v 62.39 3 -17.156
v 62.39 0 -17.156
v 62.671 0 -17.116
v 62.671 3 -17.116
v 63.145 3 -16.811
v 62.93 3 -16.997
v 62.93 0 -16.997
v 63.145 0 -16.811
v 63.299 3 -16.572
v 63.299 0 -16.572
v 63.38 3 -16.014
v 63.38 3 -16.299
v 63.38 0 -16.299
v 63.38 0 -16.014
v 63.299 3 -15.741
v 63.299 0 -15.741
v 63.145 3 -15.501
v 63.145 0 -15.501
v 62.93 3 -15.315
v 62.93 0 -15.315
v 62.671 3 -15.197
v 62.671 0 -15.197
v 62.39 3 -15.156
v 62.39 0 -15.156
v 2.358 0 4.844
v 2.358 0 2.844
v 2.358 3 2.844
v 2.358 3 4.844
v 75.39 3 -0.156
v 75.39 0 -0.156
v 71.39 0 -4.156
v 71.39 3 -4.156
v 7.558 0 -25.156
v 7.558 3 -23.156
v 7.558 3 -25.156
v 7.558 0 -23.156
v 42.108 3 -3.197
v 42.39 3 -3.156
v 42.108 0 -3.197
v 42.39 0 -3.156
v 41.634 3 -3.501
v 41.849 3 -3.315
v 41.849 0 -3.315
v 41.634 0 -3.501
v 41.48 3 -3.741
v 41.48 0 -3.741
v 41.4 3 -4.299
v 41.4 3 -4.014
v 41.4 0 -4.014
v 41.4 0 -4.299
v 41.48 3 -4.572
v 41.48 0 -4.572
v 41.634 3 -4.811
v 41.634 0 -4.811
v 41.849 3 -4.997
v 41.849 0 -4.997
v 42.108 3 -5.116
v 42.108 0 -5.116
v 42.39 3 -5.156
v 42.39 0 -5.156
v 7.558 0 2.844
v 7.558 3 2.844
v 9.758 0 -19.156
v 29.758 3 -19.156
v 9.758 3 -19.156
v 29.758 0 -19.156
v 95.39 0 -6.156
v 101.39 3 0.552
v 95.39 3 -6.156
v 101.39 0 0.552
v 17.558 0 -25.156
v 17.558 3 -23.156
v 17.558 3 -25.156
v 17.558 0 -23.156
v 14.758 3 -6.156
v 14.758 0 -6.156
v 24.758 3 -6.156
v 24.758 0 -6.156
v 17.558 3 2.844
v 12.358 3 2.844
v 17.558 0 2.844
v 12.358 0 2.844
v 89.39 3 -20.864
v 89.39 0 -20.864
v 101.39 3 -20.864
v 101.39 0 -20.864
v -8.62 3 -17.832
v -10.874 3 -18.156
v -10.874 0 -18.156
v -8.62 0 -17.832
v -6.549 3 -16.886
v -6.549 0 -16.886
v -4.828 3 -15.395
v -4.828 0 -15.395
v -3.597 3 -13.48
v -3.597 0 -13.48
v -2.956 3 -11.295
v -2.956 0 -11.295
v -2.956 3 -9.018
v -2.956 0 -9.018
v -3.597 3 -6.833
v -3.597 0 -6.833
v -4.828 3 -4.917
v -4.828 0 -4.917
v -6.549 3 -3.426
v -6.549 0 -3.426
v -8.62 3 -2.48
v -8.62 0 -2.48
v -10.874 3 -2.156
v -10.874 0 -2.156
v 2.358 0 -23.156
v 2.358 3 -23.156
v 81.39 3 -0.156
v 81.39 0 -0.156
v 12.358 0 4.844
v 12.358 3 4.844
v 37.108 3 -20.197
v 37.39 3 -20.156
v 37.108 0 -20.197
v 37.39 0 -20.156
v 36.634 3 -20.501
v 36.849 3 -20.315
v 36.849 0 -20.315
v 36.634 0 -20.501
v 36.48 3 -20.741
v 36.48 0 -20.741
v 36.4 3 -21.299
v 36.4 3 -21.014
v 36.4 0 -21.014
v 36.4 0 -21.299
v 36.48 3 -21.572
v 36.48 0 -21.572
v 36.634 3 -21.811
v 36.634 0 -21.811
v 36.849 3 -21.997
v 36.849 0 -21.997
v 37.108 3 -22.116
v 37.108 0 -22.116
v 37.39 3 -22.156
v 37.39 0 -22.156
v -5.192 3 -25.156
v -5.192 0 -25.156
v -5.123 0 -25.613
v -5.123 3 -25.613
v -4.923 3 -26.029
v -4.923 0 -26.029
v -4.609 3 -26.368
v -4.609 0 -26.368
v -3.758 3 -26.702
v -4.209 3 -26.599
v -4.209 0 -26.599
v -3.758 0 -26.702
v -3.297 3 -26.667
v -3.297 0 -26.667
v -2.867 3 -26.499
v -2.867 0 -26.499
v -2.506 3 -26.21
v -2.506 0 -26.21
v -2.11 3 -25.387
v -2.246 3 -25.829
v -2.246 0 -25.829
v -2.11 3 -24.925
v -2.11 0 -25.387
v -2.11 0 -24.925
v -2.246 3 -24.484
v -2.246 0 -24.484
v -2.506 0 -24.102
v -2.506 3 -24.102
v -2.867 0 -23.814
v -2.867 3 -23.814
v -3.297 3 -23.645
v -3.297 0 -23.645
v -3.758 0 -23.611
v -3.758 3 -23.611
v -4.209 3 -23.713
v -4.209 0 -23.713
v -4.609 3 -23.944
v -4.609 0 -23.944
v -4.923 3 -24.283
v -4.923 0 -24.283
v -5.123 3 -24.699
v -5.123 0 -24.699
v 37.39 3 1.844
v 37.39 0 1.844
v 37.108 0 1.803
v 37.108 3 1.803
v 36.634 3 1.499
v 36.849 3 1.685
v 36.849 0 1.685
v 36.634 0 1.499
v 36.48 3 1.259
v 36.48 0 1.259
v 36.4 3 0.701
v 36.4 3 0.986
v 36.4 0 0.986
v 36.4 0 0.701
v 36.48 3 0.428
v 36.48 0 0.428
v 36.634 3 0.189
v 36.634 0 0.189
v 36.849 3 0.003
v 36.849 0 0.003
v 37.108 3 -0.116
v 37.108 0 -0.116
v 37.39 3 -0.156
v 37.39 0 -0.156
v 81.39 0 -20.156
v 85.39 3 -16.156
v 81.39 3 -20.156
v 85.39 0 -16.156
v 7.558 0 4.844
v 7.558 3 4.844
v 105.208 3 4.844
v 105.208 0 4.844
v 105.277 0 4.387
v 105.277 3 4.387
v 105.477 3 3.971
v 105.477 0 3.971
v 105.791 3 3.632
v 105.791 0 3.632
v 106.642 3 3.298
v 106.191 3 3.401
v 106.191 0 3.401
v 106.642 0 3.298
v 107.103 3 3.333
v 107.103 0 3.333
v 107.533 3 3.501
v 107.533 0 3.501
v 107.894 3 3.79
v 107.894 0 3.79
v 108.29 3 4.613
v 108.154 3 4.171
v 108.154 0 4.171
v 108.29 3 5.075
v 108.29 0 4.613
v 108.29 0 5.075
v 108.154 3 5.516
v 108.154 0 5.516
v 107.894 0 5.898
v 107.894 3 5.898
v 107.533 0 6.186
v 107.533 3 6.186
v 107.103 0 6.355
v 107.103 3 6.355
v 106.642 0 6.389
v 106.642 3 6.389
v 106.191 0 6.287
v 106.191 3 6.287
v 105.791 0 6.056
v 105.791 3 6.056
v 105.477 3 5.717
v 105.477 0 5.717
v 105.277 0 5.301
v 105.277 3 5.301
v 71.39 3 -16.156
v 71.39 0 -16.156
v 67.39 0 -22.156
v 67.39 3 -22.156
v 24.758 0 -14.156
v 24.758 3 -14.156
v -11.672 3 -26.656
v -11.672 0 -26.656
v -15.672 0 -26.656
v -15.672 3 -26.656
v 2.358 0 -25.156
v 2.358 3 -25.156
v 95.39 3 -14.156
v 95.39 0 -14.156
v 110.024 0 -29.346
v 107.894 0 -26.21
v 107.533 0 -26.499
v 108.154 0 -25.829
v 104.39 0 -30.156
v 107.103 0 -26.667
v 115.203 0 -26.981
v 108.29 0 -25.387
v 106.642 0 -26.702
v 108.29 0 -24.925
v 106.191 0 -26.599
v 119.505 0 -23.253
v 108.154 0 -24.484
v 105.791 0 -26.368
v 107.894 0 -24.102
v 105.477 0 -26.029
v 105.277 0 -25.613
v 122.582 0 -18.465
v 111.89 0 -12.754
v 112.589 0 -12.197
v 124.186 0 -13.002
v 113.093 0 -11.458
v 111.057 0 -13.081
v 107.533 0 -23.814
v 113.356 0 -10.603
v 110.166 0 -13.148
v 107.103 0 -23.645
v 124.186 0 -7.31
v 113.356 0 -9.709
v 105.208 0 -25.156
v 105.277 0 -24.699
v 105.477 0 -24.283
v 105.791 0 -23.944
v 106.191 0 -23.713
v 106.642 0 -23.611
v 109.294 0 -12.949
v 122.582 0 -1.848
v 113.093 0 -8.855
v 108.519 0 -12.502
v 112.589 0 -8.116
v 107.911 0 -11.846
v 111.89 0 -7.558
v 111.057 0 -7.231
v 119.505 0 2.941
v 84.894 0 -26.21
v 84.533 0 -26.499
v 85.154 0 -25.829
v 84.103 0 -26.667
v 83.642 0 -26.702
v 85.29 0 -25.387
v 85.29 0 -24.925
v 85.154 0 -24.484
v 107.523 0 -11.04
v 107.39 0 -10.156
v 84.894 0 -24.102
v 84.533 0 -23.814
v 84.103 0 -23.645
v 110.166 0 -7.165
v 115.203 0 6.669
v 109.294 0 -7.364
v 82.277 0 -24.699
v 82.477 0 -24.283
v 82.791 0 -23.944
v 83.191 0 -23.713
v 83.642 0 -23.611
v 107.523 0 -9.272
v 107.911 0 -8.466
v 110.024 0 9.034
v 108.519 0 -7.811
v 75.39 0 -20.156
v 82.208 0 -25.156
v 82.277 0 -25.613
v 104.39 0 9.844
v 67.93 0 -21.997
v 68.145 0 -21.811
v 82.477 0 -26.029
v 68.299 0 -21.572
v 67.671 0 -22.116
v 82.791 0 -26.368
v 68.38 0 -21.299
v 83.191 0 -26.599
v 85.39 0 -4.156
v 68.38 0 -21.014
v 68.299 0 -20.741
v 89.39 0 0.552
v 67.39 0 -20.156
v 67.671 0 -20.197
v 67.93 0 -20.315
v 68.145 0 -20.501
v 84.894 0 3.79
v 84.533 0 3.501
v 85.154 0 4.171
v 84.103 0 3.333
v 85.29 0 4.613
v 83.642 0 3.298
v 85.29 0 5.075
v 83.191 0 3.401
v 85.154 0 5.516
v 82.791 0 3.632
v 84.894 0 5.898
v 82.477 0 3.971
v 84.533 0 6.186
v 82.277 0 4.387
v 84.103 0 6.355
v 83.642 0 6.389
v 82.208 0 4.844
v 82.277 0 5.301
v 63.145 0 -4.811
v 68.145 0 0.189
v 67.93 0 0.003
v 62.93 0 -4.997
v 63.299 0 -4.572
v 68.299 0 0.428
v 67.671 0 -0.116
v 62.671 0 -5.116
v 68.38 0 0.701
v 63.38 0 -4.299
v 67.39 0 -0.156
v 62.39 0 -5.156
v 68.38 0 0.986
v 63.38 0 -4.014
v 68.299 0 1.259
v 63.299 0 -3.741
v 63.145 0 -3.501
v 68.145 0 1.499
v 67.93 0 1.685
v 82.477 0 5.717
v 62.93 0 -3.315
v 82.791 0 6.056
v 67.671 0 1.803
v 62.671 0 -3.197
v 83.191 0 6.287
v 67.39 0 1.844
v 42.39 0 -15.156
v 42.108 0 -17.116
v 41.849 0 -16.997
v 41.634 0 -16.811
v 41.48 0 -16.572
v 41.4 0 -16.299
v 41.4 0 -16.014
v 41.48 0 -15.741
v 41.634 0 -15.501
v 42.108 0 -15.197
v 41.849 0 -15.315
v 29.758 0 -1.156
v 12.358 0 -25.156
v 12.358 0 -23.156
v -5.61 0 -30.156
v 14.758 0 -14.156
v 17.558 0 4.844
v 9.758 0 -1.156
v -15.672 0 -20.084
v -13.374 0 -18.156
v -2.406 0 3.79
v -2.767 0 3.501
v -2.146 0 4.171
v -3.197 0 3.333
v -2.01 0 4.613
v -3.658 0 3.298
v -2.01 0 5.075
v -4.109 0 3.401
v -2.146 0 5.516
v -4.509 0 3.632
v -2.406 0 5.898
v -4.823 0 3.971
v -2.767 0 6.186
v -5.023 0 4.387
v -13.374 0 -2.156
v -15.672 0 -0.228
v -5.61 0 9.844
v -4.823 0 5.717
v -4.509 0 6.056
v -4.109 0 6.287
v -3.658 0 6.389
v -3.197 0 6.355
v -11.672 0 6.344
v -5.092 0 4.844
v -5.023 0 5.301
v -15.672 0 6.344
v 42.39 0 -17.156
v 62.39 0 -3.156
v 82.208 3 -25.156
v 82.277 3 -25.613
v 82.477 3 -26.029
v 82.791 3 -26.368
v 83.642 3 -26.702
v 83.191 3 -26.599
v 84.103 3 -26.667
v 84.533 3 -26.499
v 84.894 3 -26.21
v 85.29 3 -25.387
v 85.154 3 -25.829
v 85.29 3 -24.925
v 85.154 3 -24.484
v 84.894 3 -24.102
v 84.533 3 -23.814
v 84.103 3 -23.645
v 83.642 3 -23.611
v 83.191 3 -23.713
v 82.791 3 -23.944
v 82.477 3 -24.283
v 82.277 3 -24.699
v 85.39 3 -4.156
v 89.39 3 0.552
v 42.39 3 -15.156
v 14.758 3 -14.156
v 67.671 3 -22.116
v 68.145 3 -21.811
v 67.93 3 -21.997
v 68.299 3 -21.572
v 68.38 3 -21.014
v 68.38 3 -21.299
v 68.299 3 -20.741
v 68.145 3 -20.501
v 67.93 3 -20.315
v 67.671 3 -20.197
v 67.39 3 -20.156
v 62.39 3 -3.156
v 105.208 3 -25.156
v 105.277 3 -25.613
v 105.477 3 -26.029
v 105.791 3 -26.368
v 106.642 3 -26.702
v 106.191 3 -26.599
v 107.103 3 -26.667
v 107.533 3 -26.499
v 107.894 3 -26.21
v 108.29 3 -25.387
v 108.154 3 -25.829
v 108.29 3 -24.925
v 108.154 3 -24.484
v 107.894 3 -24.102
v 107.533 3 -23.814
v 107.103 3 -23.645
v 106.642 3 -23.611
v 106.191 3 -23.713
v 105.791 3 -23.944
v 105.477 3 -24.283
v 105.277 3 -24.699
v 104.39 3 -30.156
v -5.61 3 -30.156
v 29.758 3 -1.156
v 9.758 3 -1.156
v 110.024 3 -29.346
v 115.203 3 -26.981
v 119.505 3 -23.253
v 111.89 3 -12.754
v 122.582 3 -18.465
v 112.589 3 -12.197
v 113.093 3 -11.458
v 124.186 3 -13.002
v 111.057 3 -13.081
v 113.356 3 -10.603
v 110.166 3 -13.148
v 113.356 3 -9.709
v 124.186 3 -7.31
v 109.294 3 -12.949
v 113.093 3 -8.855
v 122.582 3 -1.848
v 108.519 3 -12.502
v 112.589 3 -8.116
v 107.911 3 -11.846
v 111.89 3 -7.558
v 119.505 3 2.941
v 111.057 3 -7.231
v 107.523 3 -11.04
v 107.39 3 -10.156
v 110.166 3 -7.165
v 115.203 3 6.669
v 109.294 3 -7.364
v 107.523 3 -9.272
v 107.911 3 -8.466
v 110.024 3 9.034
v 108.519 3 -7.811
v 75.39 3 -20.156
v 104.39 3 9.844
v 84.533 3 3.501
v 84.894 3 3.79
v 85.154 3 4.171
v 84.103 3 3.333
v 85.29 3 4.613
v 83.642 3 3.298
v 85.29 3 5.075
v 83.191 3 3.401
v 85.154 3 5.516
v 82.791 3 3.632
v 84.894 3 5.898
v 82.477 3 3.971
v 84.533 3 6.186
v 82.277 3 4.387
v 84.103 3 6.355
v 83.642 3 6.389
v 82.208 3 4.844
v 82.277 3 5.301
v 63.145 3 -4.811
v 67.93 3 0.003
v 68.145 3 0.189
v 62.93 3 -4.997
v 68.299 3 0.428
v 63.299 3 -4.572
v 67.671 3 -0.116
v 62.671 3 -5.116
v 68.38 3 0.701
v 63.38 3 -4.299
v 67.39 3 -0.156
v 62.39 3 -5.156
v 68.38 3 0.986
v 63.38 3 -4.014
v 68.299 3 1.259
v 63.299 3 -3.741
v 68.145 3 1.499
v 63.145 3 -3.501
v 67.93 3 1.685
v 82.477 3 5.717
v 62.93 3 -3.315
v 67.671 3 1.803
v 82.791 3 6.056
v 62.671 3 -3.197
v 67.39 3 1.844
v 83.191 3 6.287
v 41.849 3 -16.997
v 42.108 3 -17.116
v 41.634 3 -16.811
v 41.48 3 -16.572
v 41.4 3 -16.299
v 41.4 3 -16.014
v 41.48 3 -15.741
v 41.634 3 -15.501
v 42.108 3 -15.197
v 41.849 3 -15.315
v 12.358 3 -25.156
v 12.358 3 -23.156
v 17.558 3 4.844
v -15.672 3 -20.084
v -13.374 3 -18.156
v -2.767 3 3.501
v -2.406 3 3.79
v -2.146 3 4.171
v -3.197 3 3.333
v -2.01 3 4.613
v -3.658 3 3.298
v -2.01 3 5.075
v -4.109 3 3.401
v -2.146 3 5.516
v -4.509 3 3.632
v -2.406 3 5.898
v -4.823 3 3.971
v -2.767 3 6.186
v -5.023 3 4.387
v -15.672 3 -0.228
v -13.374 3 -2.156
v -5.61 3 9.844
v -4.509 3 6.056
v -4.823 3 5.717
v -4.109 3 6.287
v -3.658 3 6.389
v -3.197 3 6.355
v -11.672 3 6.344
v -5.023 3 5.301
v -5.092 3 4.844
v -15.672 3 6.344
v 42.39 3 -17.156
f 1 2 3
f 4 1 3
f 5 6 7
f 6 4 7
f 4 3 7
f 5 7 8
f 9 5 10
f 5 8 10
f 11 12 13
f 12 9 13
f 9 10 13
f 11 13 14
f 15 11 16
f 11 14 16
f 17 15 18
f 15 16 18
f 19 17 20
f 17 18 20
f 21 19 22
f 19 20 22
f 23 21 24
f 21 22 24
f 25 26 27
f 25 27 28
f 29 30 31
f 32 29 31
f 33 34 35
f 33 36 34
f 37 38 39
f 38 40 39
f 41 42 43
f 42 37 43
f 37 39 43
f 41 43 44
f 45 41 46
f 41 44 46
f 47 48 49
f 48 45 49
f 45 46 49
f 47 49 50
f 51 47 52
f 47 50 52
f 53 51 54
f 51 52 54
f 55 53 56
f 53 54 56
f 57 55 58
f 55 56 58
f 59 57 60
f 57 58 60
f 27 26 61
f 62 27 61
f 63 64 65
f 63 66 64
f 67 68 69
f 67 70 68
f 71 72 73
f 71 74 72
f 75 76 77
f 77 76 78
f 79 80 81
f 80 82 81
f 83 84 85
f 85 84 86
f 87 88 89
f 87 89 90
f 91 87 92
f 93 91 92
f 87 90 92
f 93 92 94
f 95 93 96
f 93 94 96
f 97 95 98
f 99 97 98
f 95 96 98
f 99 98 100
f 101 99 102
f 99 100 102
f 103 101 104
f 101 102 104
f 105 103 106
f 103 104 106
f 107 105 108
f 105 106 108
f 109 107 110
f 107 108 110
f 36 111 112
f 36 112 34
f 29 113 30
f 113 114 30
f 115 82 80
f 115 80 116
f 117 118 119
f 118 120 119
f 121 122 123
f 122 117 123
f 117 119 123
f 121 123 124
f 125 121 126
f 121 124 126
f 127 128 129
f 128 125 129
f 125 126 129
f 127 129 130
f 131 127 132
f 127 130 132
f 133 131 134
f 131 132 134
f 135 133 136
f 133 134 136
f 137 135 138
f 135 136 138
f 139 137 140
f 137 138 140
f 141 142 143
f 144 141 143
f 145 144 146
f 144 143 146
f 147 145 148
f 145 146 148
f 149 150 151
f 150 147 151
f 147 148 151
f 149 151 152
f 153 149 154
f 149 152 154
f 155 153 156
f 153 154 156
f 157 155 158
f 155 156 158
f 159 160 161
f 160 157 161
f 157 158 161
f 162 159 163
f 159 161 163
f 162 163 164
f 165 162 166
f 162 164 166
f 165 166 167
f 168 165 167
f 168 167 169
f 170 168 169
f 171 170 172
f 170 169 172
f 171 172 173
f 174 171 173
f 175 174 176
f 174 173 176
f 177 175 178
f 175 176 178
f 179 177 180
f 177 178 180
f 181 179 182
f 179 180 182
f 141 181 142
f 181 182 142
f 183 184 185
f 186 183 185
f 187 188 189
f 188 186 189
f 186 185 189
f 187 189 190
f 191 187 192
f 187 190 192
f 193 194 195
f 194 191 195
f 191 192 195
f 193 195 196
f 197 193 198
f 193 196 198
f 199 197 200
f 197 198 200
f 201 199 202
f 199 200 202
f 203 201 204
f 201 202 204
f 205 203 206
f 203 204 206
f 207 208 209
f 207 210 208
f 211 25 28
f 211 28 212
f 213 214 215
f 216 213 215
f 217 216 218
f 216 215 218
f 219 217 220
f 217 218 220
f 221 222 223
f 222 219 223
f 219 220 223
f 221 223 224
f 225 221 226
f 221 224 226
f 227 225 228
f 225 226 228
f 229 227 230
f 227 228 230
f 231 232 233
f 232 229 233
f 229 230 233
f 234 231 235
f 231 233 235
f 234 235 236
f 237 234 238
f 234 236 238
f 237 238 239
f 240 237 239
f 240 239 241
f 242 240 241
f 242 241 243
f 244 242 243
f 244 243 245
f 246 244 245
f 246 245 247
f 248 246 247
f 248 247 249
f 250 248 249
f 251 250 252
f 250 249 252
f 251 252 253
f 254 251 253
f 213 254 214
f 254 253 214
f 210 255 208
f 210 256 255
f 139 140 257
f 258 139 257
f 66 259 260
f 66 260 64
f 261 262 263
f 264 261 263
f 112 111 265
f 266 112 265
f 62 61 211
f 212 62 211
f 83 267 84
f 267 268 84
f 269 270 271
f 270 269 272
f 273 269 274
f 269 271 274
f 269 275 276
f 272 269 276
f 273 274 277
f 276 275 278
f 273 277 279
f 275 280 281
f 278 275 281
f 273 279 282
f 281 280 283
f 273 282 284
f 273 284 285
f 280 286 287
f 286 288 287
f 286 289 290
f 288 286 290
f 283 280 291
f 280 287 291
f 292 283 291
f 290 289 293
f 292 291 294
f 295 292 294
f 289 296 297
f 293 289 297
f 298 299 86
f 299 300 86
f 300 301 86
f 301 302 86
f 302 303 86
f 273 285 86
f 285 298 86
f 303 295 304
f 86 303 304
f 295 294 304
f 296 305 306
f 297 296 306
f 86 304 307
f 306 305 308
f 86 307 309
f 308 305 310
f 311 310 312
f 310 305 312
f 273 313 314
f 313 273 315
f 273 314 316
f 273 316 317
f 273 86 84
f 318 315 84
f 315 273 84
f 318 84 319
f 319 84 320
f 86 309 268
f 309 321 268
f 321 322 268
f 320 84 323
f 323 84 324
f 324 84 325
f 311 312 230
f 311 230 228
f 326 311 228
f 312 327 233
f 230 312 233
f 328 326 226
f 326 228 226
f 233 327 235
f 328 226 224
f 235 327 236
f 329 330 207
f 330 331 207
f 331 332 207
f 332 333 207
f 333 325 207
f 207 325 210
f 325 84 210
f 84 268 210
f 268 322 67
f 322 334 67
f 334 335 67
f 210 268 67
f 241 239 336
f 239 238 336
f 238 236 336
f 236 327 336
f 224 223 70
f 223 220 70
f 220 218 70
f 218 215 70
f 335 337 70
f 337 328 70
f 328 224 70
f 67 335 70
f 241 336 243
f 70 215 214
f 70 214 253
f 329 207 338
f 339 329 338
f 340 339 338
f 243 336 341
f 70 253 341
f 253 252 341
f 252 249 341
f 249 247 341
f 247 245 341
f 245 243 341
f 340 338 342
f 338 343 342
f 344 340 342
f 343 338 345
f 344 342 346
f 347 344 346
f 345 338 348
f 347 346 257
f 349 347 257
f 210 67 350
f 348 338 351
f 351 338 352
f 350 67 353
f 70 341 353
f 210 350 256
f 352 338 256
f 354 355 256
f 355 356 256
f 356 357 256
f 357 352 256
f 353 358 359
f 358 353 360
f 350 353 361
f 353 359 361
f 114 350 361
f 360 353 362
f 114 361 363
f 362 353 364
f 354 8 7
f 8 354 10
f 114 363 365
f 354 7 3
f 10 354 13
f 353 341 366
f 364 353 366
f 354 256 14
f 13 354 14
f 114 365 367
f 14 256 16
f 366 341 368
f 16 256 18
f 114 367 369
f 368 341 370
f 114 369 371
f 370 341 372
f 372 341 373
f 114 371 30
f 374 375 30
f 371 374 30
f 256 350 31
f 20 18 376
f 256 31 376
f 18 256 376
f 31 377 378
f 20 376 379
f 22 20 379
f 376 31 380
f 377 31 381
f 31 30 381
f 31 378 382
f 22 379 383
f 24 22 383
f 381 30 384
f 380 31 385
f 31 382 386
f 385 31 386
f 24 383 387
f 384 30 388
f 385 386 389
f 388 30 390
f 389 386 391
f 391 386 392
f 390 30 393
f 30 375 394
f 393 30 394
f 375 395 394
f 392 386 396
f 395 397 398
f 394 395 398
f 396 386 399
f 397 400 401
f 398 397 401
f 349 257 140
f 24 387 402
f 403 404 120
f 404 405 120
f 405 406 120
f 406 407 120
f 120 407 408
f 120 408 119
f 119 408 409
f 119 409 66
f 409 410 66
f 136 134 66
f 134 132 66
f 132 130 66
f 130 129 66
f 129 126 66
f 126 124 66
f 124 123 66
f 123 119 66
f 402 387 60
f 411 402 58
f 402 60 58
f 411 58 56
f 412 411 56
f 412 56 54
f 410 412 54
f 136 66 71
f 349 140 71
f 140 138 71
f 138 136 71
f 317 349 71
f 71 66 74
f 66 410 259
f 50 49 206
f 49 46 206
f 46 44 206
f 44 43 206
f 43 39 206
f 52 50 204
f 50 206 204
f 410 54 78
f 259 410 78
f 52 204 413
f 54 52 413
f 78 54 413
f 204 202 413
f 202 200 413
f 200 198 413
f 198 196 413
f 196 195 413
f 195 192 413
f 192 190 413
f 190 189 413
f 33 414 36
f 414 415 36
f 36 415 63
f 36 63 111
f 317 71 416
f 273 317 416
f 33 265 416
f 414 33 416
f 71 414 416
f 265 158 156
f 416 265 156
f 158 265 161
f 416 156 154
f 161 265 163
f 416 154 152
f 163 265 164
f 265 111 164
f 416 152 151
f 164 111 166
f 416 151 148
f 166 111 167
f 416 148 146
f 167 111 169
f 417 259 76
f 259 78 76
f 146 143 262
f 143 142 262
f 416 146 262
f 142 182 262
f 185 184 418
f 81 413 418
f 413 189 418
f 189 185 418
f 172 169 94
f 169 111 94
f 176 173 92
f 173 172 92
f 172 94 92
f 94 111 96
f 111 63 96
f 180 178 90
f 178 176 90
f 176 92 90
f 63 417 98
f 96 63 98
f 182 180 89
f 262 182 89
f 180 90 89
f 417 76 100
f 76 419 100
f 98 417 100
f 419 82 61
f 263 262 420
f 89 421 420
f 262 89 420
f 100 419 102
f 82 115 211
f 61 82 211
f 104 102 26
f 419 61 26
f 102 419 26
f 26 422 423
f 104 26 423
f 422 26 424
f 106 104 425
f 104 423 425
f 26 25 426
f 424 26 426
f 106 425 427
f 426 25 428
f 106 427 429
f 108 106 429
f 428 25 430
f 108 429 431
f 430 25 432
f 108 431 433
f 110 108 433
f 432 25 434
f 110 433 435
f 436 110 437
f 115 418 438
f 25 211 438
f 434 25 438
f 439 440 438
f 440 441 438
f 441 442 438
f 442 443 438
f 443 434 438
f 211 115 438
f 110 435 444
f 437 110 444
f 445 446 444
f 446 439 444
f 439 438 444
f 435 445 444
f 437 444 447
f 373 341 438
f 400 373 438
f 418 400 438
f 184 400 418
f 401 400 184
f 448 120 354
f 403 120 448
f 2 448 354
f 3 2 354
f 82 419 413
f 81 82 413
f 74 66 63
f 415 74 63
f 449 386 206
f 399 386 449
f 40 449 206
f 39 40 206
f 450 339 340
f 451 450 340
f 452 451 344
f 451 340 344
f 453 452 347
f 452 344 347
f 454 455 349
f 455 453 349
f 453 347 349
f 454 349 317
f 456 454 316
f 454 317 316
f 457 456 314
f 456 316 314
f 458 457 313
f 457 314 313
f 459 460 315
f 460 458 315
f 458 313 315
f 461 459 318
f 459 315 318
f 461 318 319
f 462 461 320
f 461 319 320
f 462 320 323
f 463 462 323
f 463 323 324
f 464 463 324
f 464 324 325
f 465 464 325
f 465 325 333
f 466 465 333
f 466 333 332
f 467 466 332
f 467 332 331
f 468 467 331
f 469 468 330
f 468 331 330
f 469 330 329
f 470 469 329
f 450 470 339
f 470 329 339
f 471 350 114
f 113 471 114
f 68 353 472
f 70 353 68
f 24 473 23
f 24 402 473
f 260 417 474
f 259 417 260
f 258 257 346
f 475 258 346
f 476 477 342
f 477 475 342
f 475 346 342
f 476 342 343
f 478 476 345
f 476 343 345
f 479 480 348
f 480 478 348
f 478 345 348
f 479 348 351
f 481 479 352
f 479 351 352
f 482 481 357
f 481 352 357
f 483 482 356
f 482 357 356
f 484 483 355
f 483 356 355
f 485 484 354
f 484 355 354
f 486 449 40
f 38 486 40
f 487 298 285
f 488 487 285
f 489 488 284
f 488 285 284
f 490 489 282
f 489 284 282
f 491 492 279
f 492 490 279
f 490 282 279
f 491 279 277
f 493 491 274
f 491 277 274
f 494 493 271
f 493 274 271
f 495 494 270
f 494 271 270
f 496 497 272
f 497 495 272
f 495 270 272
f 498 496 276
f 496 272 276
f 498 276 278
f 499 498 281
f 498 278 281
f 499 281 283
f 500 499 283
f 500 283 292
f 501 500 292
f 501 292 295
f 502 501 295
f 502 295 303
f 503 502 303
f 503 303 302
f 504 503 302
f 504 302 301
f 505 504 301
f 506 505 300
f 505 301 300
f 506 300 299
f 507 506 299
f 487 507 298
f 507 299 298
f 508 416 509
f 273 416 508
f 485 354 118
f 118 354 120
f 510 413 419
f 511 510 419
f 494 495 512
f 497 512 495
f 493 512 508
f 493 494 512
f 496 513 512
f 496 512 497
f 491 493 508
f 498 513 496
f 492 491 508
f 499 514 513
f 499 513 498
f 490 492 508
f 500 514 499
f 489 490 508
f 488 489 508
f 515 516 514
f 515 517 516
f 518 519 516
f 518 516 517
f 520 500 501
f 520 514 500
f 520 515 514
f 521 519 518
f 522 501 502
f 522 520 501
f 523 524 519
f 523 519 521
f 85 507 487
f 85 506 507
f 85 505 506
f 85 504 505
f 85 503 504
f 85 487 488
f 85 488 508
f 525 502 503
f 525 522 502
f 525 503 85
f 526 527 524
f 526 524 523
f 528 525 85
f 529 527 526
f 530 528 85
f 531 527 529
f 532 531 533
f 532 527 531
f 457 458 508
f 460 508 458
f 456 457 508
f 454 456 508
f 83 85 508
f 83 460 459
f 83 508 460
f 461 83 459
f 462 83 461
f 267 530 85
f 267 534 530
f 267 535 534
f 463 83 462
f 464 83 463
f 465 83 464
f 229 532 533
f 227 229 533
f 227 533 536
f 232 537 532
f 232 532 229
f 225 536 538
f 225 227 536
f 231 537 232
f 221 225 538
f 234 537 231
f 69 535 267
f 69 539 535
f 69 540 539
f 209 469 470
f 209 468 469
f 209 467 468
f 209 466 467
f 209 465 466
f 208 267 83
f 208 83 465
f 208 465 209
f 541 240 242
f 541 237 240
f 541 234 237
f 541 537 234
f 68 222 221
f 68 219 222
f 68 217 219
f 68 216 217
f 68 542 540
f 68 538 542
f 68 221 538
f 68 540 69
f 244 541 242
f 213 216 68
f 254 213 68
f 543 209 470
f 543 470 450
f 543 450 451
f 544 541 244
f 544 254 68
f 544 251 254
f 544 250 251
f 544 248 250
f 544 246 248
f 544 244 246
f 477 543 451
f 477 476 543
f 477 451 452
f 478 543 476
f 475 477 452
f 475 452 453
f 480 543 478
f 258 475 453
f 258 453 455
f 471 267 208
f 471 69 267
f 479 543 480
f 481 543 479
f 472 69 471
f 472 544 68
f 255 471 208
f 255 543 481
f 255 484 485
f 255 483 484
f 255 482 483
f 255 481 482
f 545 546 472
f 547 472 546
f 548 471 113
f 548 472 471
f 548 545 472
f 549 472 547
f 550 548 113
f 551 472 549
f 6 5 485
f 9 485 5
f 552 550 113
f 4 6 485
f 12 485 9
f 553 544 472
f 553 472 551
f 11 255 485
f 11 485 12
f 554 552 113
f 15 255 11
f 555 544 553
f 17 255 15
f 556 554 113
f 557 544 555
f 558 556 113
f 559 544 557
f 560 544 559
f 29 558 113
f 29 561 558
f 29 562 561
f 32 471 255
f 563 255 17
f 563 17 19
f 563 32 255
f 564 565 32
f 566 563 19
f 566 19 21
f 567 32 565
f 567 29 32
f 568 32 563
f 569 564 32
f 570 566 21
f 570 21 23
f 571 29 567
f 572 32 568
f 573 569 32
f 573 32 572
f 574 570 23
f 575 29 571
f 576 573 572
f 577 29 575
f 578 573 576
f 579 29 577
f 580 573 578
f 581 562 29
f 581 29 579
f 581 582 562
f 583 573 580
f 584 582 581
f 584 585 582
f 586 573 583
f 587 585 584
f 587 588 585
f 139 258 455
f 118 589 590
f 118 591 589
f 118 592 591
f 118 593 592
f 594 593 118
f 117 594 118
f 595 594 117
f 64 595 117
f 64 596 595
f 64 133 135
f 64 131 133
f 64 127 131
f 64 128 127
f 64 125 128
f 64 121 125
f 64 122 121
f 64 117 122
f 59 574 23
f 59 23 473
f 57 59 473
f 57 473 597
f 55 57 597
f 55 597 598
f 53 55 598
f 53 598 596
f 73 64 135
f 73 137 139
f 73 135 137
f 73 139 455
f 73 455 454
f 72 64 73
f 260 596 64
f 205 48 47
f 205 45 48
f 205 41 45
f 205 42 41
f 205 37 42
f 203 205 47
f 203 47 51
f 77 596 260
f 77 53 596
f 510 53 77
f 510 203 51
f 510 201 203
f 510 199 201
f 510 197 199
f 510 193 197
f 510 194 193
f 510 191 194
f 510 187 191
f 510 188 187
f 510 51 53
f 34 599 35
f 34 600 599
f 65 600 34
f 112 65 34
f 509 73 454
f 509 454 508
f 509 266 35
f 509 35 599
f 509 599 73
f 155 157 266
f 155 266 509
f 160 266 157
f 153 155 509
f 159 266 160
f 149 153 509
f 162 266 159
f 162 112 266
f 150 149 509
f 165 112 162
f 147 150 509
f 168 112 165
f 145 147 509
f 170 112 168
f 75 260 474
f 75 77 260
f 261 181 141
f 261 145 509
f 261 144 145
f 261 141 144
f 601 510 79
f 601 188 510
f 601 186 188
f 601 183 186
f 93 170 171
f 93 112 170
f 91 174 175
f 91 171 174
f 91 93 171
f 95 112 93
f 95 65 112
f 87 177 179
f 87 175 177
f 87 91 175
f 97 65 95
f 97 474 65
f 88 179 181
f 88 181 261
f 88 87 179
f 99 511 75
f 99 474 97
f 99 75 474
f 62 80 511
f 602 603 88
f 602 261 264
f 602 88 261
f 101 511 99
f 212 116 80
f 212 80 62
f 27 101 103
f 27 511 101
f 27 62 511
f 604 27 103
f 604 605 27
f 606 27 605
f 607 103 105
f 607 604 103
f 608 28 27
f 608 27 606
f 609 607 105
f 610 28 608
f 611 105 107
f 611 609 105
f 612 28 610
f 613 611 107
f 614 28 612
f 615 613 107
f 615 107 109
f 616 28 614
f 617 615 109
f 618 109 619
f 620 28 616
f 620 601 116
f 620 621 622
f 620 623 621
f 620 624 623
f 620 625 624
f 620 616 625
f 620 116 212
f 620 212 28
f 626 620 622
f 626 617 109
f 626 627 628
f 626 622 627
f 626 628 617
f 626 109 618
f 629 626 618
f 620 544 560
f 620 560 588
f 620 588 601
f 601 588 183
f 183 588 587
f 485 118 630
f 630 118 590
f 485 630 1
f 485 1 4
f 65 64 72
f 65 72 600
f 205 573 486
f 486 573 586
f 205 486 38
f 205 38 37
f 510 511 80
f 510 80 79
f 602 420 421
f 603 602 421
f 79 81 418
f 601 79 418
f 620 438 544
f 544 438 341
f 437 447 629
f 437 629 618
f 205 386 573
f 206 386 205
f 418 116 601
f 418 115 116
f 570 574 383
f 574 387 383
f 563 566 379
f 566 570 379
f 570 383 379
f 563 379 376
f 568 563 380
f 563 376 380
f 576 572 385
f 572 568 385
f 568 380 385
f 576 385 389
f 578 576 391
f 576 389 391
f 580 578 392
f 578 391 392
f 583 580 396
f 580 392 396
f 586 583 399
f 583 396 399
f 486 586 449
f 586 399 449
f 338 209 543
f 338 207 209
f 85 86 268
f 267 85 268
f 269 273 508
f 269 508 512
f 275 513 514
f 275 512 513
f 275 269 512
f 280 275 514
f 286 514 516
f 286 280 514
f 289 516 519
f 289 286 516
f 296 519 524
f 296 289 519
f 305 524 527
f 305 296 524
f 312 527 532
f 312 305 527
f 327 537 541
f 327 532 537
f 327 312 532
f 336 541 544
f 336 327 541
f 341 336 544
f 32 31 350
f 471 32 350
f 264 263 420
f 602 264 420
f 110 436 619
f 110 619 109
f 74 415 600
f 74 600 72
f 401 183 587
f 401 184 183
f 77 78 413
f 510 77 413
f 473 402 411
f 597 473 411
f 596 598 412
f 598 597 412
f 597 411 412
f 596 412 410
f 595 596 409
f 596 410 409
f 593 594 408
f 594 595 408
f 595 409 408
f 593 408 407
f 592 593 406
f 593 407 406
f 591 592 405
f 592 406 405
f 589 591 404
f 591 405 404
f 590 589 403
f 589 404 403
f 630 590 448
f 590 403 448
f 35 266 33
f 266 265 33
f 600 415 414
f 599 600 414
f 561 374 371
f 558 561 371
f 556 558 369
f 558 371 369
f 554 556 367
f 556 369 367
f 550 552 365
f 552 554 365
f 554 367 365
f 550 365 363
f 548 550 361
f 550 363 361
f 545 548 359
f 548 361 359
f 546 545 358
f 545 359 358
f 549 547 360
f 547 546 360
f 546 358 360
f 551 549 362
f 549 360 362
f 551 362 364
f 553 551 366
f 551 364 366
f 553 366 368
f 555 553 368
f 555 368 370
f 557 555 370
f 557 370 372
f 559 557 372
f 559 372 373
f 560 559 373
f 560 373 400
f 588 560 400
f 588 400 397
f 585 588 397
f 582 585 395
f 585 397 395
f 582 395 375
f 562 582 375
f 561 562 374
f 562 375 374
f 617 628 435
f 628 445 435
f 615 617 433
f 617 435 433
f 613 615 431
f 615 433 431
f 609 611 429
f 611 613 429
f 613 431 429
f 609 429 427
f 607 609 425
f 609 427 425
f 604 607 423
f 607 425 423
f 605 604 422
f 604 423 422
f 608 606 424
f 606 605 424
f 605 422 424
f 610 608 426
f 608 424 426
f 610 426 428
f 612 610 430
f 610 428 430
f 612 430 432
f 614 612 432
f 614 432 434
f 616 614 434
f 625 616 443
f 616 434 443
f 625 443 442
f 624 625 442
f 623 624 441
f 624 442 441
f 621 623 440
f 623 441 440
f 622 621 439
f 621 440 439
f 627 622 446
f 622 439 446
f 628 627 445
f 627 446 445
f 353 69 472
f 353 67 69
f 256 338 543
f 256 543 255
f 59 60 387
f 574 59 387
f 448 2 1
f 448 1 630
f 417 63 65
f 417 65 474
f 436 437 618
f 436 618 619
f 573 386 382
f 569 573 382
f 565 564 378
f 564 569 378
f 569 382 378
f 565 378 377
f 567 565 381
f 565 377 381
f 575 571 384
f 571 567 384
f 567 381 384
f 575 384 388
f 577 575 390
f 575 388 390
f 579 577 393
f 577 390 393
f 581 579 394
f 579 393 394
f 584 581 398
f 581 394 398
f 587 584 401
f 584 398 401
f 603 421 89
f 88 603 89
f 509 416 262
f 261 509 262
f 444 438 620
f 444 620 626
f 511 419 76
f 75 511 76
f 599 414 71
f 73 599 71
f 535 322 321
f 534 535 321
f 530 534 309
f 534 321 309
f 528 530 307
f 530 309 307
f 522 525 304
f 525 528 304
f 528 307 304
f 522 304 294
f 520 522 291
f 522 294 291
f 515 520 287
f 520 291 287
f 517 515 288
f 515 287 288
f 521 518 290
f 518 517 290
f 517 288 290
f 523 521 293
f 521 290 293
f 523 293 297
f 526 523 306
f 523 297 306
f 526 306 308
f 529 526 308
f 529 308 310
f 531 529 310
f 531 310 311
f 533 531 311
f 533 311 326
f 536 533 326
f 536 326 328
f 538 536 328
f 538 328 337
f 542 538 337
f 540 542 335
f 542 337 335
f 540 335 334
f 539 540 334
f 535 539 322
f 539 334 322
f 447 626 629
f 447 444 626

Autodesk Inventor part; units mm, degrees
ref_plane "YZ Plane" through (0, 0, 0) normal (1, 0, 0) x (0, 1, 0)
ref_plane "XZ Plane" through (0, 0, 0) normal (0, 1, 0) x (-1, 0, 0)
ref_plane "XY Plane" through (0, 0, 0) normal (0, 0, 1) x (1, 0, 0)
sketch "Sketch1" plane through (0, 0, 0) normal (0, 1, 0) x (-1, 0, 0)
  line L0 (-71.934, -191.4381) -> (-71.9231, -191.4456)
  line L1 (19.6087, -153.4475) -> (19.6065, -153.4456)
  line L2 (-67.3897, -0.1562) -> (-37.3897, -0.1562)
  line L3 (-37.3897, 1.8438) -> (-67.3897, 1.8438)
  line L4 (-62.3897, -3.1562) -> (-42.3897, -3.1562)
  line L5 (-42.3897, -5.1562) -> (-62.3897, -5.1562)
  line L6 (-113.9275, -186.1817) -> (-113.9275, -186.2664)
  line L7 (-115.4443, -311.1974) -> (-115.4443, -311.1982)
  line L8 (-113.9275, -180.4456) -> (-113.9275, -180.5089)
  circle A0 centre (-110.3897, -10.1562) radius 3
  arc A1 (10.8743, -2.1562) -> (10.8743, -18.1562) centre (10.8743, -10.1562) ccw
  arc A2 (-42.3897, -5.1562) -> (-42.3897, -3.1562) centre (-42.3897, -4.1562) ccw
  arc A3 (-62.3897, -3.1562) -> (-62.3897, -5.1562) centre (-62.3897, -4.1562) ccw
  arc A4 (-67.3897, 1.8438) -> (-67.3897, -0.1562) centre (-67.3897, 0.8438) ccw
  arc A5 (-37.3897, -0.1562) -> (-37.3897, 1.8438) centre (-37.3897, 0.8438) ccw
  arc A6 (-104.3897, 9.8438) -> (-104.3897, -30.1562) centre (-104.3897, -10.1562) ccw
  line L9 (5.6103, 9.8438) -> (11.6725, 6.3438)
  line L10 (11.6725, 6.3438) -> (15.6725, 6.3438)
  line L11 (15.6725, 6.3438) -> (15.6725, -0.2278)
  line L12 (15.6725, -0.2278) -> (13.3743, -2.1562)
  line L13 (13.3743, -2.1562) -> (10.8743, -2.1562)
  line L14 (5.6103, 9.8438) -> (-104.3897, 9.8438)
  line L15 (-89.3897, 0.552) -> (-101.3897, 0.552)
  line L16 (-101.3897, 0.552) -> (-95.3897, -6.1562)
  line L17 (-95.3897, -6.1562) -> (-89.3897, 0.552)
  line L18 (-85.3897, -4.1562) -> (-81.3897, -0.1562)
  line L19 (-75.3897, -0.1562) -> (-71.3897, -4.1562)
  line L20 (-71.3897, -4.1562) -> (-85.3897, -4.1562)
  line L21 (-81.3897, -0.1562) -> (-75.3897, -0.1562)
  line L22 (-68.2196, -182.5089) -> (-68.232, -182.5206)
  line L23 (-104.3897, 9.8438) -> (-104.3897, -30.1562)
  line L24 (-104.3897, -10.1562) -> (10.8743, -10.1562)
  line L25 (-110.3897, -10.1562) -> (-104.3897, -10.1562)
  line L26 (10.8743, -2.1562) -> (10.8743, -18.1562)
  line L27 (5.6103, -30.1562) -> (11.6725, -26.6562)
  line L28 (11.6725, -26.6562) -> (15.6725, -26.6562)
  line L29 (15.6725, -26.6562) -> (15.6725, -20.0845)
  line L30 (15.6725, -20.0845) -> (13.3743, -18.1562)
  line L31 (13.3743, -18.1562) -> (10.8743, -18.1562)
  line L32 (5.6103, -30.1562) -> (-104.3897, -30.1562)
  line L33 (-2.3577, 2.8438) -> (-7.5577, 2.8438)
  line L34 (-7.5577, 2.8438) -> (-7.5577, 4.8438)
  line L35 (-2.3577, 4.8438) -> (-7.5577, 4.8438)
  line L36 (-2.3577, 2.8438) -> (-2.3577, 4.8438)
  line L37 (-12.3577, 2.8438) -> (-17.5577, 2.8438)
  line L38 (-17.5577, 2.8438) -> (-17.5577, 4.8438)
  line L39 (-12.3577, 4.8438) -> (-17.5577, 4.8438)
  line L40 (-12.3577, 2.8438) -> (-12.3577, 4.8438)
  line L41 (-46.7577, -10.1562) -> (-46.7577, 9.8438)
  line L42 (-2.3577, -23.1562) -> (-7.5577, -23.1562)
  line L43 (-7.5577, -23.1562) -> (-7.5577, -25.1562)
  line L44 (-2.3577, -25.1562) -> (-7.5577, -25.1562)
  line L45 (-2.3577, -23.1562) -> (-2.3577, -25.1562)
  line L46 (-12.3577, -23.1562) -> (-17.5577, -23.1562)
  line L47 (-17.5577, -23.1562) -> (-17.5577, -25.1562)
  line L48 (-12.3577, -25.1562) -> (-17.5577, -25.1562)
  line L49 (-12.3577, -23.1562) -> (-12.3577, -25.1562)
  circle A7 centre (3.6423, -25.1562) radius 1.55
  circle A8 centre (3.5423, 4.8438) radius 1.55
  circle A9 centre (-83.7577, 4.8438) radius 1.55
  circle A10 centre (-106.7577, 4.8438) radius 1.55
  circle A11 centre (-83.7577, -25.1562) radius 1.55
  circle A12 centre (-106.7577, -25.1562) radius 1.55
  line L50 (-62.3897, -17.1562) -> (-42.3897, -17.1562)
  line L51 (-42.3897, -15.1562) -> (-62.3897, -15.1562)
  line L52 (-67.3897, -20.1562) -> (-37.3897, -20.1562)
  line L53 (-37.3897, -22.1562) -> (-67.3897, -22.1562)
  arc A13 (-42.3897, -17.1562) -> (-42.3897, -15.1562) centre (-42.3897, -16.1562) ccw
  arc A14 (-62.3897, -15.1562) -> (-62.3897, -17.1562) centre (-62.3897, -16.1562) ccw
  arc A15 (-67.3897, -20.1562) -> (-67.3897, -22.1562) centre (-67.3897, -21.1562) ccw
  arc A16 (-37.3897, -22.1562) -> (-37.3897, -20.1562) centre (-37.3897, -21.1562) ccw
  line L54 (-89.3897, -20.8644) -> (-101.3897, -20.8644)
  line L55 (-101.3897, -20.8644) -> (-95.3897, -14.1562)
  line L56 (-95.3897, -14.1562) -> (-89.3897, -20.8644)
  line L57 (-85.3897, -16.1562) -> (-81.3897, -20.1562)
  line L58 (-75.3897, -20.1562) -> (-71.3897, -16.1562)
  line L59 (-71.3897, -16.1562) -> (-85.3897, -16.1562)
  line L60 (-81.3897, -20.1562) -> (-75.3897, -20.1562)
  line L61 (-29.7577, -1.1562) -> (-9.7577, -1.1562)
  line L62 (-9.7577, -1.1562) -> (-14.7577, -6.1562)
  line L63 (-14.7577, -6.1562) -> (-24.7577, -6.1562)
  line L64 (-24.7577, -6.1562) -> (-29.7577, -1.1562)
  line L65 (-29.7577, -19.1562) -> (-9.7577, -19.1562)
  line L66 (-9.7577, -19.1562) -> (-14.7577, -14.1562)
  line L67 (-14.7577, -14.1562) -> (-24.7577, -14.1562)
  line L68 (-24.7577, -14.1562) -> (-29.7577, -19.1562)
  dimension "d39" = 6
  dimension "d54" = 40
  dimension "d55" = 6
  dimension "d56" = 20
  dimension "d58" = 110
  dimension "d60" = 150
  dimension "d61" = 130
  dimension "d62" = 4
  dimension "d63" = 2.5
  dimension "d64" = 7
  dimension "d65" = 3
  dimension "d70" = 8
  dimension "d74" = 2
  dimension "d75" = 5.2
  dimension "d76" = 2
  dimension "d77" = 5.2
  dimension "d78" = 4.8
  dimension "d79" = 13
  dimension "d80" = 13
  dimension "d81" = 29.2
  dimension "d82" = 3.1
  dimension "d83" = 3.1
  dimension "d84" = 5.9
  dimension "d85" = 6
  dimension "d86" = 15
  dimension "d87" = 15
  dimension "d88" = 3.1
  dimension "d89" = 3.1
  dimension "d90" = 15
  dimension "d91" = 15
  dimension "d92" = 37
  dimension "d93" = 23
  dimension "d94" = 12
  dimension "d95" = 9
  dimension "d96" = 14
  dimension "d97" = 6
  dimension "d99" = 4
  dimension "d100" = 9
  dimension "d101" = 6
  dimension "d102" = 10
  dimension "d103" = 2
  dimension "d104" = 20
  dimension "d105" = 2
  dimension "d106" = 5
  dimension "d108" = 30
  dimension "d109" = 10
  dimension "d110" = 42
  dimension "d111" = 5
  dimension "d112" = 20
  dimension "d113" = 10
  dimension "d114" = 45
  dimension "d115" = 4
  dimension "d116" = 22
extrude "Extrusion1" add sketch "Sketch1" along normal blind 3 contours L2 L41 L4 A3 L5 L24 L23 L14 L3 A4 | L2 A5 L3 L41 L14 L9 L10 L11 L12 L13 A1 L24 L5 A2 L4 | L24 A1 L31 L30 L29 L28 L27 L32 L23 | L23 A6
properties part number "topplate.rev4"
